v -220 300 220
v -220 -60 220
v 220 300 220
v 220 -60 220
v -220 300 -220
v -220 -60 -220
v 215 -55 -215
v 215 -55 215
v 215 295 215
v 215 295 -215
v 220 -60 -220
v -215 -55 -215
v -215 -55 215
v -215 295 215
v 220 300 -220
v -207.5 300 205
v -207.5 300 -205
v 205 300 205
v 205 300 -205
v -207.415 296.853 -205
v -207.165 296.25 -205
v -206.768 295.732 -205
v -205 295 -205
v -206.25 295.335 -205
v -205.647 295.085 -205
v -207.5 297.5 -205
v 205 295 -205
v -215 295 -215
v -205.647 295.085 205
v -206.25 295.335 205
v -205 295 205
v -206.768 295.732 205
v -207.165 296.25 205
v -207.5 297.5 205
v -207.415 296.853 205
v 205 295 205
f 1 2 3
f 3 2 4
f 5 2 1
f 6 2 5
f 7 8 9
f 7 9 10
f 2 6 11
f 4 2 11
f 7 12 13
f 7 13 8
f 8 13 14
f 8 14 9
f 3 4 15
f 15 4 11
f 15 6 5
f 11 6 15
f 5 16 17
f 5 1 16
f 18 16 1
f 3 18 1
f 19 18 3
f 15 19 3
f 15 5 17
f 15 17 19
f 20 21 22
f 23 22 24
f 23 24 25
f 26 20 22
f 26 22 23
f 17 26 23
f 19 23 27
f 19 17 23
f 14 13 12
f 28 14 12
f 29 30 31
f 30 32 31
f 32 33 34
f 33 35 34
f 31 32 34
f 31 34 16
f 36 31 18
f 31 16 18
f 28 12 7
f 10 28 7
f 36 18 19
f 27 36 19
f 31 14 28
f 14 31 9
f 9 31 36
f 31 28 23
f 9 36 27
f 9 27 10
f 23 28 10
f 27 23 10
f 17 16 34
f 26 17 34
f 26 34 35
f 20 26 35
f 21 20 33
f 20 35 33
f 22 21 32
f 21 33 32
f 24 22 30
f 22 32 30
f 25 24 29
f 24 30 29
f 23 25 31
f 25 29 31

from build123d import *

# Parameters (mm, degrees)
SKETCH_1_W                      = 440
SKETCH_1_H                      = 440
SKETCH_1_W_2                    = 430
SKETCH_1_H_2                    = 430
EXTRUDE_1_DEPTH                 = 360
SKETCH_2_W                      = 440
SKETCH_2_H                      = 440
EXTRUDE_2_DEPTH                 = 5
SKETCH_3_W                      = 440
SKETCH_3_H                      = 440
SKETCH_3_W_2                    = 410
SKETCH_3_H_2                    = 410
EXTRUDE_3_DEPTH                 = 5
CUT_EXTRUDE_1_REACH             = 434.204
CUT_EXTRUDE_1_DIRECTION_2_REACH = 434.204


with BuildPart() as part:
    # Эскиз1 → Бобышка-Вытянуть1 (new body)
    with BuildSketch(Plane(origin=(0, -60, 0), x_dir=(1, 0, 0), z_dir=(0, 1, 0))):
        Rectangle(SKETCH_1_W, SKETCH_1_H)
        Rectangle(SKETCH_1_W_2, SKETCH_1_H_2, mode=Mode.SUBTRACT)
    extrude(amount=EXTRUDE_1_DEPTH)

    # Эскиз2 → Бобышка-Вытянуть2 (add)
    with BuildSketch(Plane(origin=(0, -60, 0), x_dir=(1, 0, 0), z_dir=(0, 1, 0))):
        Rectangle(SKETCH_2_W, SKETCH_2_H)
    extrude(amount=EXTRUDE_2_DEPTH)

    # Эскиз3 → Бобышка-Вытянуть3 (add)
    with BuildSketch(Plane(origin=(0, 300, 0), x_dir=(1, 0, 0), z_dir=(0, 1, 0))):
        Rectangle(SKETCH_3_W, SKETCH_3_H)
        Rectangle(SKETCH_3_W_2, SKETCH_3_H_2, mode=Mode.SUBTRACT)
    extrude(amount=-EXTRUDE_3_DEPTH)

    # Вырез-Вытянуть1: up to this face of the body (flat: up to its plane)
    cut_extrude_1_end = Plane(part.part.faces().sort_by_distance((0, 297.5, -205))[0])
    # Эскиз4 → Вырез-Вытянуть1 (cut, up to the picked face)
    with BuildSketch(Plane.XY, mode=Mode.PRIVATE) as cut_extrude_1_sk1:
        with BuildLine():
            Line((-205, 295), (-205, 300))
            Line((-205, 300), (-207.5, 300))
            Line((-207.5, 300), (-207.5, 297.5))
            ThreePointArc((-207.5, 297.5), (-206.767766953, 295.732233047), (-205, 295))
        make_face()
    cut_extrude_1_tool1 = split(extrude(cut_extrude_1_sk1.sketch, amount=-CUT_EXTRUDE_1_REACH, mode=Mode.PRIVATE), bisect_by=cut_extrude_1_end, keep=Keep.BOTH, mode=Mode.PRIVATE)
    add(cut_extrude_1_tool1.solids().sort_by(Axis((-206.166873, 297.733375, 0), (0, 0, -1)))[0], mode=Mode.SUBTRACT)

    # Вырез-Вытянуть1 direction 2: up to this face of the body (flat: up to its plane)
    cut_extrude_1_direction_2_end = Plane(part.part.faces().sort_by_distance((0, 297.5, 205))[0])
    # Эскиз4 → Вырез-Вытянуть1 direction 2 (cut, up to the picked face)
    with BuildSketch(Plane.XY, mode=Mode.PRIVATE) as cut_extrude_1_direction_2_sk1:
        with BuildLine():
            Line((-205, 295), (-205, 300))
            Line((-205, 300), (-207.5, 300))
            Line((-207.5, 300), (-207.5, 297.5))
            ThreePointArc((-207.5, 297.5), (-206.767766953, 295.732233047), (-205, 295))
        make_face()
    cut_extrude_1_direction_2_tool1 = split(extrude(cut_extrude_1_direction_2_sk1.sketch, amount=CUT_EXTRUDE_1_DIRECTION_2_REACH, mode=Mode.PRIVATE), bisect_by=cut_extrude_1_direction_2_end, keep=Keep.BOTH, mode=Mode.PRIVATE)
    add(cut_extrude_1_direction_2_tool1.solids().sort_by(Axis((-206.166873, 297.733375, 0), (0, 0, 1)))[0], mode=Mode.SUBTRACT)


solid = part.part
